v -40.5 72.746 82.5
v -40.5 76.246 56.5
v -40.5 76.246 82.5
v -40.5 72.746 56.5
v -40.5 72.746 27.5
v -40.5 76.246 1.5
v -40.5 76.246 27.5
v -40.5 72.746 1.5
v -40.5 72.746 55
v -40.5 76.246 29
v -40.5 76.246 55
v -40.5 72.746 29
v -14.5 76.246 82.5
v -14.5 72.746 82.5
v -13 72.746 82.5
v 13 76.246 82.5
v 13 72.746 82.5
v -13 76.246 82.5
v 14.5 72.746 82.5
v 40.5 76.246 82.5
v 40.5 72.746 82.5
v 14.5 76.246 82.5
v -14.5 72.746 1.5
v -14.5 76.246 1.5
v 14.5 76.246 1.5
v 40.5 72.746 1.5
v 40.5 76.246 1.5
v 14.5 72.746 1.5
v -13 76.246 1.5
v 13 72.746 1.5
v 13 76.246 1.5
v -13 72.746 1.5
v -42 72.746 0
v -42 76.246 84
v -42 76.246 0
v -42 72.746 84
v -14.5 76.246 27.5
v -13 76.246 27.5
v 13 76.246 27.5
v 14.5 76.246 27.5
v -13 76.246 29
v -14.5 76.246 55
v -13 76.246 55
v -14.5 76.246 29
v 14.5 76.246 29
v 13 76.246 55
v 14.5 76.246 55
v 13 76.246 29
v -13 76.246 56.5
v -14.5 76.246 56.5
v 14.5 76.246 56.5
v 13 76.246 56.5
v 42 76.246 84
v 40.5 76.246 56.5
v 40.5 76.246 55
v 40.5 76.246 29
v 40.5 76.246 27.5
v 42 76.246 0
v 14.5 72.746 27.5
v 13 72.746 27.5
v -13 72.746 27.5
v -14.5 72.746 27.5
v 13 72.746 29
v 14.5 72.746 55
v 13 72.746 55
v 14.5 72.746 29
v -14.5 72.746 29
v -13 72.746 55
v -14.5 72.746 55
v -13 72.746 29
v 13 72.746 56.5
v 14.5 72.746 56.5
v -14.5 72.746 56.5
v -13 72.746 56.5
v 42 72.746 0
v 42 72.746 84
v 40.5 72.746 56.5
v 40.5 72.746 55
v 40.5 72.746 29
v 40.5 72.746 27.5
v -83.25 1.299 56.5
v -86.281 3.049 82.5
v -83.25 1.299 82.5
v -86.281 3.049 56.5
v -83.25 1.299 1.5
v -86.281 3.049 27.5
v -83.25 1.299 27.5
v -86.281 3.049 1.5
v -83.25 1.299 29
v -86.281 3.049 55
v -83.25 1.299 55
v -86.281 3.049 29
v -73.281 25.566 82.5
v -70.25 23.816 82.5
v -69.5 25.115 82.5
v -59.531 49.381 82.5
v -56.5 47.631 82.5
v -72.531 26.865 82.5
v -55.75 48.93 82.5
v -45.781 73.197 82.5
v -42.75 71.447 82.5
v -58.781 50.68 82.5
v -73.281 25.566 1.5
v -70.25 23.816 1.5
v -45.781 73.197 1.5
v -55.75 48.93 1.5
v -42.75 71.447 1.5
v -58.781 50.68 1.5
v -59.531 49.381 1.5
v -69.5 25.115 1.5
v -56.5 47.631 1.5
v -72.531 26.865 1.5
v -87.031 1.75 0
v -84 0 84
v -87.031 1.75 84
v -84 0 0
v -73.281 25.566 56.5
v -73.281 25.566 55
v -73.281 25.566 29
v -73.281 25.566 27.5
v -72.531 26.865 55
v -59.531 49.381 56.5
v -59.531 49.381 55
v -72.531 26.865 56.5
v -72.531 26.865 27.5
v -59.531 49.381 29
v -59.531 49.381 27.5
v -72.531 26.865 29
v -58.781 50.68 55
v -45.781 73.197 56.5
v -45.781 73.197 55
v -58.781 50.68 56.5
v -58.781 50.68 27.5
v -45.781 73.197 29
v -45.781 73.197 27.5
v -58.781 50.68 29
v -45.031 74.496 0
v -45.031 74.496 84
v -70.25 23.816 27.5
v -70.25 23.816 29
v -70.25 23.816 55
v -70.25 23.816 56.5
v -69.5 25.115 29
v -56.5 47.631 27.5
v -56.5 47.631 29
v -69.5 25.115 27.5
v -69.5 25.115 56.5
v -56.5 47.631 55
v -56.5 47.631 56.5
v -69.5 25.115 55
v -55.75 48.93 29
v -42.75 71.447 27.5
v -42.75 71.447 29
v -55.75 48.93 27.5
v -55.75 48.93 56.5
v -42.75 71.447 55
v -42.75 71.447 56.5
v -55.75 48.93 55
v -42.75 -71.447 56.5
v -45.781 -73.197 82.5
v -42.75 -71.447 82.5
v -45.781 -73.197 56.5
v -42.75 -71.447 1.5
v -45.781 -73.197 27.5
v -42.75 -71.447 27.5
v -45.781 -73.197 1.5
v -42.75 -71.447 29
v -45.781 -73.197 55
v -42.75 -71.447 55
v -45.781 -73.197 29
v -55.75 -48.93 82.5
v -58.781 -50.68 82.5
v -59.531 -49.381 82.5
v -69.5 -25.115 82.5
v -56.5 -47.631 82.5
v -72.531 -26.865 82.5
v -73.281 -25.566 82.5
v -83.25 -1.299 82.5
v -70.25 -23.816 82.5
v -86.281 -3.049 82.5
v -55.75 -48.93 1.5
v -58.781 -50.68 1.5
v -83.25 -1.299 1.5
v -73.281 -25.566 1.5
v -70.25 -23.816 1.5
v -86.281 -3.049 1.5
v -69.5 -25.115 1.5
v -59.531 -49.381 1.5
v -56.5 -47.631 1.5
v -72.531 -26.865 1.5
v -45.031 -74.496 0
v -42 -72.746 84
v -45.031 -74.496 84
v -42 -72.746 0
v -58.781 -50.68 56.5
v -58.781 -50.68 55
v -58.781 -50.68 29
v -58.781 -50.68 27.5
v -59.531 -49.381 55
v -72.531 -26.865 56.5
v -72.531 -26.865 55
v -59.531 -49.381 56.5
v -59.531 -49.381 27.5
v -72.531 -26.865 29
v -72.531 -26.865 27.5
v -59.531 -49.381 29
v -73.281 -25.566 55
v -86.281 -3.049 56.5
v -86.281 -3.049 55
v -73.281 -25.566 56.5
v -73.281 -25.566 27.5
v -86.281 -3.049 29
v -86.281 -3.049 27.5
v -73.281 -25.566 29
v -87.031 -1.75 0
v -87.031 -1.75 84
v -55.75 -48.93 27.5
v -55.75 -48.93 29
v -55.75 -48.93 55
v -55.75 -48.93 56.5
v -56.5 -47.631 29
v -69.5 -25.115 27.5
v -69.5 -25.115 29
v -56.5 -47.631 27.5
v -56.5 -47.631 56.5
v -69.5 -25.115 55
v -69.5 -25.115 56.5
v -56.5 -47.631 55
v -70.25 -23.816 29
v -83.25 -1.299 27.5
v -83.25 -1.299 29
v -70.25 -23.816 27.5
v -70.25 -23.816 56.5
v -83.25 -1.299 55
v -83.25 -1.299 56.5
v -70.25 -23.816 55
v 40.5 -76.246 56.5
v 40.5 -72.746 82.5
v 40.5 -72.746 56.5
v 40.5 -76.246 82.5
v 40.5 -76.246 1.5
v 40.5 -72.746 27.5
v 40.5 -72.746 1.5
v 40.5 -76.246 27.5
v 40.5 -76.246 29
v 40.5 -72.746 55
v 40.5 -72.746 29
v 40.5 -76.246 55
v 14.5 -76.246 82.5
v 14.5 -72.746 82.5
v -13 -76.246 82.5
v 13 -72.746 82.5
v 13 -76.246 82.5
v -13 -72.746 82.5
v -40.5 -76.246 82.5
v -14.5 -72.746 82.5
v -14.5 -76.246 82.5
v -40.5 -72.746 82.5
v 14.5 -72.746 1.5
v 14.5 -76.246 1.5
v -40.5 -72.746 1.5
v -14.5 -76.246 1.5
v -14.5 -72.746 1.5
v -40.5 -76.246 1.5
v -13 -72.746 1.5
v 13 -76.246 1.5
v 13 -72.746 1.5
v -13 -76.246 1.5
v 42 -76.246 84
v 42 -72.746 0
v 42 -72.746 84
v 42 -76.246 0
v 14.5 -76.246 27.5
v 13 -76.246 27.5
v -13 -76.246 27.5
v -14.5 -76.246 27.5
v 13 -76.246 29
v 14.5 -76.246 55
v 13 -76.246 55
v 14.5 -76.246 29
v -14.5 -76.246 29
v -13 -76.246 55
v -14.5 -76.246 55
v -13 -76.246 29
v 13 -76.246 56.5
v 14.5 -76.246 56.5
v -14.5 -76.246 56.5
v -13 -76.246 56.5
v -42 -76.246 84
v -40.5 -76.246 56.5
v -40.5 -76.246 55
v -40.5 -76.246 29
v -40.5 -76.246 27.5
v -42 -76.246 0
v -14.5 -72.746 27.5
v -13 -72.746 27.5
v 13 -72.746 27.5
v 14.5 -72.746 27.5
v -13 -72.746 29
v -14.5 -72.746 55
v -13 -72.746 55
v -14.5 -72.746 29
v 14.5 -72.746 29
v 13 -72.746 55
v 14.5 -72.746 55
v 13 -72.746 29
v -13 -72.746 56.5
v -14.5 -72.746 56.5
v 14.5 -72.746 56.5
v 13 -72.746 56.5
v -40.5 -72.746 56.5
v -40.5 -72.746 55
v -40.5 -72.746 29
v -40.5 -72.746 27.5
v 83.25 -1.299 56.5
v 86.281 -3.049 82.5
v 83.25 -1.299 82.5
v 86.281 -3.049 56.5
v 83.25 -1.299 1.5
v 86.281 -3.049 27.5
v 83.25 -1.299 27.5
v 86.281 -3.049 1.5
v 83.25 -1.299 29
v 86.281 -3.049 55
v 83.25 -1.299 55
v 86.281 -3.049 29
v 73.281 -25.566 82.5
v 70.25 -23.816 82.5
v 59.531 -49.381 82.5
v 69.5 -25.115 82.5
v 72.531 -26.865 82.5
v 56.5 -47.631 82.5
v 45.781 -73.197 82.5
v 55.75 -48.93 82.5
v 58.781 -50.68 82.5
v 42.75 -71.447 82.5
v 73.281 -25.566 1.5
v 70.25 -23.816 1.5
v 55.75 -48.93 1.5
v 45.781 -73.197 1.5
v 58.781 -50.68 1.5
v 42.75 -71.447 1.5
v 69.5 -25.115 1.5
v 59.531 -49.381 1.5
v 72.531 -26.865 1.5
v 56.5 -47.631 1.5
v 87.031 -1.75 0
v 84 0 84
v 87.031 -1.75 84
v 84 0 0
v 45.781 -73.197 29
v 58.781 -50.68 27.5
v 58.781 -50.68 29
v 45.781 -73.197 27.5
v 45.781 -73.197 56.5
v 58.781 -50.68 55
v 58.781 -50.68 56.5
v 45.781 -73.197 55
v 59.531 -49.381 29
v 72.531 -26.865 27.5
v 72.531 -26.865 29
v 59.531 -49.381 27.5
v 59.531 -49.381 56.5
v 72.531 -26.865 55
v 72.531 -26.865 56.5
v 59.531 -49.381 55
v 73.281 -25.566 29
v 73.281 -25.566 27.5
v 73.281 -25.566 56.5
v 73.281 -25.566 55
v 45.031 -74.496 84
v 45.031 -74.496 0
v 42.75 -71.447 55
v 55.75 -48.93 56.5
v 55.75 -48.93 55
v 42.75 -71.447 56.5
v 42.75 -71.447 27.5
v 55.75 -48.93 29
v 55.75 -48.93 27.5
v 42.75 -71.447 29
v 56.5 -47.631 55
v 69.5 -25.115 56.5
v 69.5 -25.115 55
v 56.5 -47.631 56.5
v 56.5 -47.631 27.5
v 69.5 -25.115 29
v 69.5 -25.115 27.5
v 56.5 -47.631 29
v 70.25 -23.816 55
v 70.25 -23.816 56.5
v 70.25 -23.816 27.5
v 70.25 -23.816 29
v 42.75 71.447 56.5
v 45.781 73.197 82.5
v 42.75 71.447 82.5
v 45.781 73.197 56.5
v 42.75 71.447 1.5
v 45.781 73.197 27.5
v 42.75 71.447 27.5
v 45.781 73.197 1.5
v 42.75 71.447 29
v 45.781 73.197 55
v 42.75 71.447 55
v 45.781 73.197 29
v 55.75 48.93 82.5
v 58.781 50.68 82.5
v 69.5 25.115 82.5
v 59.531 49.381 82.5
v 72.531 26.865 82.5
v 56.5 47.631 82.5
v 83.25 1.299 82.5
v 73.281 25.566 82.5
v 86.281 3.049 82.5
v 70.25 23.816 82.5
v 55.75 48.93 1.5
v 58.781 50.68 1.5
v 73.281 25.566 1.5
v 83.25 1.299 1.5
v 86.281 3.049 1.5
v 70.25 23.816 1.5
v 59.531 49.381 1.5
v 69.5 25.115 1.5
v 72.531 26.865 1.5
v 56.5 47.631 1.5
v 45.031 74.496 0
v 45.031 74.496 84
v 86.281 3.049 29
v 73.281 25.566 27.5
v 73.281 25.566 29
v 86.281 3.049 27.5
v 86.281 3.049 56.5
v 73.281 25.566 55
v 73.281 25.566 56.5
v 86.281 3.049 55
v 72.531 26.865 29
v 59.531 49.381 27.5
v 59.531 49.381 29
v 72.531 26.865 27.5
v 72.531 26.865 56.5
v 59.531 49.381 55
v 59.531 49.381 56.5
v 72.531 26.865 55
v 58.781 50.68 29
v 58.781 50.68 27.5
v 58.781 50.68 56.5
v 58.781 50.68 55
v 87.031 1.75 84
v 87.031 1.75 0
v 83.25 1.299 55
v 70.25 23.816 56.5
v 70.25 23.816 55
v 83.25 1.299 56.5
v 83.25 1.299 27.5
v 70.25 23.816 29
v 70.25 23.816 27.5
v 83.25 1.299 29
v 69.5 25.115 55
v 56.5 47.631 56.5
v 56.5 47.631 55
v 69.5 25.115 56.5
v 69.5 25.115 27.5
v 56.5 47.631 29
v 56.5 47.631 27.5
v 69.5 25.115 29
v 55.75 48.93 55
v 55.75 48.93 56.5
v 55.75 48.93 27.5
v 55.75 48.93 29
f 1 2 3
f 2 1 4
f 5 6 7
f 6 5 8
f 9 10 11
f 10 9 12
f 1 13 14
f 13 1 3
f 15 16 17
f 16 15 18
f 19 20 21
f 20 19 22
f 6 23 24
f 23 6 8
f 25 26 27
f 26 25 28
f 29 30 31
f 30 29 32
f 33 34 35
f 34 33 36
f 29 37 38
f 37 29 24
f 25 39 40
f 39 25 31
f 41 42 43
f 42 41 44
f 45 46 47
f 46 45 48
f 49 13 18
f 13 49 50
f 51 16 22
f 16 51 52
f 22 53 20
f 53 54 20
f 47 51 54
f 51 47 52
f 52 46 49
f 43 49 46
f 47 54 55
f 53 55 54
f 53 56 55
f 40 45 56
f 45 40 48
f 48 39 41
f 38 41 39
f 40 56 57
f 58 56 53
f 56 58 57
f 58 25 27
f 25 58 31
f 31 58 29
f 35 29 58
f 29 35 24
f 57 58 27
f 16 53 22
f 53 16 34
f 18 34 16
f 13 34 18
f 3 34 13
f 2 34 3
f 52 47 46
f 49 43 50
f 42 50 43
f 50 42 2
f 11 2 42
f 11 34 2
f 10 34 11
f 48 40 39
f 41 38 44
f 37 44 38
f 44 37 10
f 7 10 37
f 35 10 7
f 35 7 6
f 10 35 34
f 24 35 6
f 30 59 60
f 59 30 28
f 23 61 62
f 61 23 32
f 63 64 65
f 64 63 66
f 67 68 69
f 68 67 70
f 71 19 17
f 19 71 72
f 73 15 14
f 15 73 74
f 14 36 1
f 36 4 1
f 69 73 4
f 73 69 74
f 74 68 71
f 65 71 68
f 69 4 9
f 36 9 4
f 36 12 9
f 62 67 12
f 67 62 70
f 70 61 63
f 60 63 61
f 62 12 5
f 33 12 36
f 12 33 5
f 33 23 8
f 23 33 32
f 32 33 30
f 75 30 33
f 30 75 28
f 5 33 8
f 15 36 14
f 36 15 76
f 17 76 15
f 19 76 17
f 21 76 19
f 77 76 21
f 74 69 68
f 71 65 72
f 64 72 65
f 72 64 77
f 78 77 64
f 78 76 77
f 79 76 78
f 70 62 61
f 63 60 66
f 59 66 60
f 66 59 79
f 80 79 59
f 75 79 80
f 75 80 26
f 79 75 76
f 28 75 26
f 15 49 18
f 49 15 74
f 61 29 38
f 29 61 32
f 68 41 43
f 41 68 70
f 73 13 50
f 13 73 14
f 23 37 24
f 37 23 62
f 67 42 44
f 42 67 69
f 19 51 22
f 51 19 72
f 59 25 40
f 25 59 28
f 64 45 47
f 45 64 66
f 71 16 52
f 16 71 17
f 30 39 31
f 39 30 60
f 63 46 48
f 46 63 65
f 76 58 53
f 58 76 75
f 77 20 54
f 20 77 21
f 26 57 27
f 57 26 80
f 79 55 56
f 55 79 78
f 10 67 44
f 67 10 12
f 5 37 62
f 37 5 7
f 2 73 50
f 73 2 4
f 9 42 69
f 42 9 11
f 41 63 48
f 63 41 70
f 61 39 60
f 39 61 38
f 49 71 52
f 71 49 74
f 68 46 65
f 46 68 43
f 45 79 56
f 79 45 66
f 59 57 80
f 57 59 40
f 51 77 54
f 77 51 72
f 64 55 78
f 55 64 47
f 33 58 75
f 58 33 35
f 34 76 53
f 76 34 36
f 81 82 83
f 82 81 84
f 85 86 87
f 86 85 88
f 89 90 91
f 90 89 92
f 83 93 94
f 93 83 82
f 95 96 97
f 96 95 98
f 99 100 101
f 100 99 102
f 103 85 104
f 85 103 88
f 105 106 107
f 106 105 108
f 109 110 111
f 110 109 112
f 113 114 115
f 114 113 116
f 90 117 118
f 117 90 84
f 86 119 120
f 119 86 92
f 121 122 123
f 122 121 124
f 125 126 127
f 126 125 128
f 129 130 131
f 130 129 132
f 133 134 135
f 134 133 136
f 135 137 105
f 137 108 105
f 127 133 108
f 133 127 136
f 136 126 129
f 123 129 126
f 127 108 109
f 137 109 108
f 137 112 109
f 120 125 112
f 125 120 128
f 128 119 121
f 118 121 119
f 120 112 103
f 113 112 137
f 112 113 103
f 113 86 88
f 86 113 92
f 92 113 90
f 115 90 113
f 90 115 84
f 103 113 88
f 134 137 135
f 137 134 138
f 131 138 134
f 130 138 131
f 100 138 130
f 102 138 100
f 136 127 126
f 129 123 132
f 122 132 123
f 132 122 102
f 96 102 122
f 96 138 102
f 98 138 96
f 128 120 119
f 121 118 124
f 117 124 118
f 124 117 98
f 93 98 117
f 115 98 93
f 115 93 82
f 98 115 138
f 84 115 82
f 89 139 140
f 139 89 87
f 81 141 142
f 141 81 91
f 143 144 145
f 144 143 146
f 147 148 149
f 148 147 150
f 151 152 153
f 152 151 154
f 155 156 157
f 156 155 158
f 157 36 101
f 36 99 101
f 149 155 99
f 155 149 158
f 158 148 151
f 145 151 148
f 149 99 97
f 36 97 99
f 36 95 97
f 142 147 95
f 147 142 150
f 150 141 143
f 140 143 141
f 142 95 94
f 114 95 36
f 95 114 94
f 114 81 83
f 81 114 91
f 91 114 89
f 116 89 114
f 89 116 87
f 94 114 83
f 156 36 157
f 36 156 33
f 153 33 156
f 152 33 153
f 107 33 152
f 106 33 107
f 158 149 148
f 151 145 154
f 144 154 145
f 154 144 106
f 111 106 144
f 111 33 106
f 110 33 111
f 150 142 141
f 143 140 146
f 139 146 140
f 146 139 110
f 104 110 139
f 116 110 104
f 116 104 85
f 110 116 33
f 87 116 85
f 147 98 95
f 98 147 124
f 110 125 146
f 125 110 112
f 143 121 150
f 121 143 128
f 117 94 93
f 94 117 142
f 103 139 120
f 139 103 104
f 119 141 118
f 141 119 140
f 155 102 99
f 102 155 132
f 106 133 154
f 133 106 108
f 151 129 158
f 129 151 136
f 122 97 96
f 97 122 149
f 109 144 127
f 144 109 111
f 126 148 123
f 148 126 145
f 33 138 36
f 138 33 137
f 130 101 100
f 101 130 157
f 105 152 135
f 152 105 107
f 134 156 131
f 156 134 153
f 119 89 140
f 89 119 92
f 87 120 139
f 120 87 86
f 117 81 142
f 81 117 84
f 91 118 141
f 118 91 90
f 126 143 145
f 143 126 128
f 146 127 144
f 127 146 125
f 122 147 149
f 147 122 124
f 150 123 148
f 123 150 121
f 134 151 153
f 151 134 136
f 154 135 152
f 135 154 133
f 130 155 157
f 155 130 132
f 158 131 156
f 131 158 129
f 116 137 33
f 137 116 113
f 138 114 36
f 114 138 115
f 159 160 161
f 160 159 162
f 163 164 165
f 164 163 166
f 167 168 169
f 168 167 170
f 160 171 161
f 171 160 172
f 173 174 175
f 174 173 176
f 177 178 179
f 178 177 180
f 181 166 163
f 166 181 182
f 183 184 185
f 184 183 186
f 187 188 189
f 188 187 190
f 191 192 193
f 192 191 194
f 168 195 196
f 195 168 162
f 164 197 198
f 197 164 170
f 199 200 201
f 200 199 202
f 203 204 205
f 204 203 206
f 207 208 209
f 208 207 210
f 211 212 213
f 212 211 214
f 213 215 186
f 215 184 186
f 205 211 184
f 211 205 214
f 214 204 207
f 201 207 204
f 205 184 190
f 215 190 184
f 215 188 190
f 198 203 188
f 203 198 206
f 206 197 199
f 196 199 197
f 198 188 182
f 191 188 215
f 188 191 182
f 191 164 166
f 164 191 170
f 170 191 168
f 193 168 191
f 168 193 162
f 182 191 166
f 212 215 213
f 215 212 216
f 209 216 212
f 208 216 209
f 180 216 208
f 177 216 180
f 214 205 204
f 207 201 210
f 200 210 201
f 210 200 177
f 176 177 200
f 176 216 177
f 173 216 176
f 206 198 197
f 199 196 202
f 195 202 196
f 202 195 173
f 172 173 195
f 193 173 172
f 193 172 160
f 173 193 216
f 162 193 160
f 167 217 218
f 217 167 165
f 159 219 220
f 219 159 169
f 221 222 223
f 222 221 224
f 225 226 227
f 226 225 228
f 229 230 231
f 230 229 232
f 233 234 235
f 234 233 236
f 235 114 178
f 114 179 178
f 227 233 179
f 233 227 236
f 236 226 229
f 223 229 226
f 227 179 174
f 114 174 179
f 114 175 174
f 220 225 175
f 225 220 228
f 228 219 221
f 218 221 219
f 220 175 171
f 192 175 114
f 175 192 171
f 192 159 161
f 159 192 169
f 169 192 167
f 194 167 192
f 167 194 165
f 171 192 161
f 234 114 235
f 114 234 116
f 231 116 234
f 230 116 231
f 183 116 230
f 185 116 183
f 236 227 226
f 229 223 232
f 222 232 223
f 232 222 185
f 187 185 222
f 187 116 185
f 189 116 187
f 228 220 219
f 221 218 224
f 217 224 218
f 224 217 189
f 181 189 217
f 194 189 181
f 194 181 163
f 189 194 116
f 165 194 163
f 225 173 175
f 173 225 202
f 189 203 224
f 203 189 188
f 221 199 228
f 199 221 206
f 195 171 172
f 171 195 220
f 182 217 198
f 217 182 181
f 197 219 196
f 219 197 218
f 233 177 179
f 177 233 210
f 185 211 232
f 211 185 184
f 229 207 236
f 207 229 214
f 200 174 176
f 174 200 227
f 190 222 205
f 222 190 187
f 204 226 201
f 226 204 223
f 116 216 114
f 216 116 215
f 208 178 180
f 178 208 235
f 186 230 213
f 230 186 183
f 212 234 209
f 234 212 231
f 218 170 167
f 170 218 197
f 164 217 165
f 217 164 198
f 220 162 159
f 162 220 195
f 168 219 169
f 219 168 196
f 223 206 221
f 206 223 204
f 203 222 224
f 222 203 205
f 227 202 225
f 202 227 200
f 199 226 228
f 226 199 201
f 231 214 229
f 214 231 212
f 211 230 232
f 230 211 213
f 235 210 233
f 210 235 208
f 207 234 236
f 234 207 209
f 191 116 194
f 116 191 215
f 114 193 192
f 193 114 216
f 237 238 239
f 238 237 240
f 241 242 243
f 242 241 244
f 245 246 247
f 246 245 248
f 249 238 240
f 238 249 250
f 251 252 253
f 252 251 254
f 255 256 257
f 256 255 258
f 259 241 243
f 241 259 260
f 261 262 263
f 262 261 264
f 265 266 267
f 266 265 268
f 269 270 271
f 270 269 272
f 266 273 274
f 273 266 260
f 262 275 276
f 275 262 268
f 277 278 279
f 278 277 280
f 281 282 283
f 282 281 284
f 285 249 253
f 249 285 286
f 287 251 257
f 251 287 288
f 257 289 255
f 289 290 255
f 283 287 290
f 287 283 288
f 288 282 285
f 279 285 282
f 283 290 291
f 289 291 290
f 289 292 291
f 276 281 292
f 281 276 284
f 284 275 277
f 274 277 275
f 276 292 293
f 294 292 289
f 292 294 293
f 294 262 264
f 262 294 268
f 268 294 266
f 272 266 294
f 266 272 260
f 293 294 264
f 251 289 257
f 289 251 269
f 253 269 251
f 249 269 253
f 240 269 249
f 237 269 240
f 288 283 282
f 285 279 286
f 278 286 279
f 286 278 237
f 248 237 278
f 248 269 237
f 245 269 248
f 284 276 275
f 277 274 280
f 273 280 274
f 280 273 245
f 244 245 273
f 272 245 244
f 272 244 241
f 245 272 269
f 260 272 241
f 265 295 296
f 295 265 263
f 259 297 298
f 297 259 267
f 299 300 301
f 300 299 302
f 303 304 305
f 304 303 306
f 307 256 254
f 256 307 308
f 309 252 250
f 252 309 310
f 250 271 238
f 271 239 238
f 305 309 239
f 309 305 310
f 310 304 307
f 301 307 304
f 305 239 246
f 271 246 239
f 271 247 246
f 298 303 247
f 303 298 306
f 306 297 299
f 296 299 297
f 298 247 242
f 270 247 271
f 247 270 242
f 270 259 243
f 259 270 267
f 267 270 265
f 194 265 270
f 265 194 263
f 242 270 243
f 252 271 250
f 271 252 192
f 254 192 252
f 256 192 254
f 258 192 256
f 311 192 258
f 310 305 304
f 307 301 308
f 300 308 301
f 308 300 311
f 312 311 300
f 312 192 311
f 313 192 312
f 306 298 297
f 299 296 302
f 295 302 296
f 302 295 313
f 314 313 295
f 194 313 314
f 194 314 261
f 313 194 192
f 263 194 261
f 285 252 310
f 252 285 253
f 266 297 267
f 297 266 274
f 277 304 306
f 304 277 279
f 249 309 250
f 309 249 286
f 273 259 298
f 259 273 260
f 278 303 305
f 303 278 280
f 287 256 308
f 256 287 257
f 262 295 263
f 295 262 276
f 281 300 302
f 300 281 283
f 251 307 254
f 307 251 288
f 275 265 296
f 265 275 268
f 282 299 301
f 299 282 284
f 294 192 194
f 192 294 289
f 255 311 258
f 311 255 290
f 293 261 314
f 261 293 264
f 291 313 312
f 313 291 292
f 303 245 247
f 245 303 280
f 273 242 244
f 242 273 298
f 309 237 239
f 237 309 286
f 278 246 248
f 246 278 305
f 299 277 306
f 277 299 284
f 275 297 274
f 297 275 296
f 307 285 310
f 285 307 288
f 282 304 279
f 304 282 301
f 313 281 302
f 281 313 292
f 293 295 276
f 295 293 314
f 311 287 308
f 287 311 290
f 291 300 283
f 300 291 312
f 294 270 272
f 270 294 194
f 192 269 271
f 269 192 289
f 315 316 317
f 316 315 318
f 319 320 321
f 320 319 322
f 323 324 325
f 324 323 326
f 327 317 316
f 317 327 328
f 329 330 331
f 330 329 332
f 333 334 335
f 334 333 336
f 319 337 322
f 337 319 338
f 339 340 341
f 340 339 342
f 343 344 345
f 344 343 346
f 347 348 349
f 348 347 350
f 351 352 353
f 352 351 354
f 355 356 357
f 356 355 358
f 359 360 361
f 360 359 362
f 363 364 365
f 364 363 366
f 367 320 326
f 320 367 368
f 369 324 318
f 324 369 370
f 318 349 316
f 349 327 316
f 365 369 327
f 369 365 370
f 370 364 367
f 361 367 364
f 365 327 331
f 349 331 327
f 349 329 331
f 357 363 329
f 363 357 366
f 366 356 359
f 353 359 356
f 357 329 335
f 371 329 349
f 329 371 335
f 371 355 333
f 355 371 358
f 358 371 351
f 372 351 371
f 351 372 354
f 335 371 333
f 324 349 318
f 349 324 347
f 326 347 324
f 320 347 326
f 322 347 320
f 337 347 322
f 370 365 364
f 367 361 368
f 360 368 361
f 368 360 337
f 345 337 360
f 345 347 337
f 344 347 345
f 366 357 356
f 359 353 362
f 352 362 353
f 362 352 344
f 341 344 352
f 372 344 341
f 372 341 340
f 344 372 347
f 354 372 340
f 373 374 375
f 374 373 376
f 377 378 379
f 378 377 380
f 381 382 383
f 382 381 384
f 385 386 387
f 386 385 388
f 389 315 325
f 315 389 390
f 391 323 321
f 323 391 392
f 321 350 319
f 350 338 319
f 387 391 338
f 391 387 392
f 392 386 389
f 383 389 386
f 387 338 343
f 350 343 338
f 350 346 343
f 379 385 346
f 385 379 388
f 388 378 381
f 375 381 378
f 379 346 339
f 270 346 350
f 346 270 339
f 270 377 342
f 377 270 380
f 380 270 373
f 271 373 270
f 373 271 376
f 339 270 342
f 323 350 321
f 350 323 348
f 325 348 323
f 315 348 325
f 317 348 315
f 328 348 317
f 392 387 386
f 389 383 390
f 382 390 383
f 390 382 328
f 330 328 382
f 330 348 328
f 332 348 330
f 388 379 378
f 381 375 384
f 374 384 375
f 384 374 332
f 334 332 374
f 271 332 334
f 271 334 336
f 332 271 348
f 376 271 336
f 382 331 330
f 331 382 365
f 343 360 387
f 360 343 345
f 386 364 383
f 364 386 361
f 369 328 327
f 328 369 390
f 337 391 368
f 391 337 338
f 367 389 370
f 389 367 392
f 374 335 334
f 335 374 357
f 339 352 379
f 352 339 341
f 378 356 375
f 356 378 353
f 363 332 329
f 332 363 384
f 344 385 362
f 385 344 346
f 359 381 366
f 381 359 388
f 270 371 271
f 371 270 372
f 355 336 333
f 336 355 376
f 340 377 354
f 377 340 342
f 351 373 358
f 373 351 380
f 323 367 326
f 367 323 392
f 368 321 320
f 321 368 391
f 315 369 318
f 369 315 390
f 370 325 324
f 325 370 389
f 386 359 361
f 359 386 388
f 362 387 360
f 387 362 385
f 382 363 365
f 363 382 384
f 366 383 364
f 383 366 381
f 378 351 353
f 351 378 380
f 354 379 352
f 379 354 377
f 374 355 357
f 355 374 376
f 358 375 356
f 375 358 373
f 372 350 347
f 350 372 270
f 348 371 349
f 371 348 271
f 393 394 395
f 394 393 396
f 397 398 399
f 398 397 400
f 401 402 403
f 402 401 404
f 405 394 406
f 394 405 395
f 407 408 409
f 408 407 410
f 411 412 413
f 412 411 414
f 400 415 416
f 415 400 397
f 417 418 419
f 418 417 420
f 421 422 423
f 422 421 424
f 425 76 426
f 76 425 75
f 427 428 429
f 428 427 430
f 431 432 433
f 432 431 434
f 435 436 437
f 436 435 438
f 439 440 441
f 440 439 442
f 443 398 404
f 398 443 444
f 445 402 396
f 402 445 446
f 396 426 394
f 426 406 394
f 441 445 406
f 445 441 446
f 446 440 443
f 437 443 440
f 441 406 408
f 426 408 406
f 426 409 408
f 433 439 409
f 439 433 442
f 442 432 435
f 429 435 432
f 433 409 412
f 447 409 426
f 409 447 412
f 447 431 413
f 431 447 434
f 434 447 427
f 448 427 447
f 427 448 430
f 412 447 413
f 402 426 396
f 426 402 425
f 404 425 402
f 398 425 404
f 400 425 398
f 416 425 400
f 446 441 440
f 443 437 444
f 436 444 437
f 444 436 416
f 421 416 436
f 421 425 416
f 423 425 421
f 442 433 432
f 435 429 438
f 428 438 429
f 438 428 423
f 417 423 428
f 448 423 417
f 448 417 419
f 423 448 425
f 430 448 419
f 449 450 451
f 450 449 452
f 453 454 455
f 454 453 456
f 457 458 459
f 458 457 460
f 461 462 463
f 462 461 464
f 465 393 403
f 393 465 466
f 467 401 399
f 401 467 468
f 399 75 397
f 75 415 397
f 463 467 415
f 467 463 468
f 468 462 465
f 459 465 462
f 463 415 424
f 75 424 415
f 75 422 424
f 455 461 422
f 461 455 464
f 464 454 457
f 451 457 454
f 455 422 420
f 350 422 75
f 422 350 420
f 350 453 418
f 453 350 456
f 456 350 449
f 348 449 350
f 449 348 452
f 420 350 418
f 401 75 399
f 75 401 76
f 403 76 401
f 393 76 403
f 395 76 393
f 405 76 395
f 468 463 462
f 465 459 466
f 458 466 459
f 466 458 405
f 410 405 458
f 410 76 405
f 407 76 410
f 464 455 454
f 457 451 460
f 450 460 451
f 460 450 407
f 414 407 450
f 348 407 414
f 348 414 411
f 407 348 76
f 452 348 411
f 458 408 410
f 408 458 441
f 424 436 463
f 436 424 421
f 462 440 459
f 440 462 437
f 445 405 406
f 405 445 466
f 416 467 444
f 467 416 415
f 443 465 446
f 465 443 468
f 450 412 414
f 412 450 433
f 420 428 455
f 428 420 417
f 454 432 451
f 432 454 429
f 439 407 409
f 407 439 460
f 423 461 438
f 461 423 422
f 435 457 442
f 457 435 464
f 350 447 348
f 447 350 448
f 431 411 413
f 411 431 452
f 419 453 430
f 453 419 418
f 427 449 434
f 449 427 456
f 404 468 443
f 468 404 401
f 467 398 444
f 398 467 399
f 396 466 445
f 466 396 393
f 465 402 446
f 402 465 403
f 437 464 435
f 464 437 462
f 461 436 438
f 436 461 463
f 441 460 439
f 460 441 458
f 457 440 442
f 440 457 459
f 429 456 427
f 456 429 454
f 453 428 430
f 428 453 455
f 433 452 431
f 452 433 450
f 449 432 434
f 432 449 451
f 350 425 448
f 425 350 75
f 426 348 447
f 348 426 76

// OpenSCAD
// file: lumber.scad
lumber_nominal_thick = 2;
lumber_width_thick = 4;

lumber_thick = lumber_nominal_thick - 0.5;
lumber_width = lumber_width_thick - 0.5;

module beam(length) {
  echo(str("BEAM: beam (",lumber_thick,"x",lumber_width,"): length ",  length, "in."));
  color("brown") {
    cube([length, lumber_width, lumber_thick], false);
  }
}

module stud(length) {
  echo(str("BEAM: stud (",lumber_thick,"x",lumber_width,"): length ",  length, "in."));
  color("brown") {
    cube([lumber_thick, lumber_width, length], false);
  }
}

module noggin(length) {
  echo(str("BEAM: noggin (",lumber_thick,"x",lumber_width,"): length ",  length, "in."));
  color("brown") {
    cube([length, lumber_width, lumber_thick], false);
  }
}
// file: config.scad
wall_height = 7 * 12;
wall_width = 7 * 12;

vertical_sections = 3;
horizontal_sections = 3;
// main file
include <config.scad>;
include <lumber.scad>;

module wall() {
  translate([
    -wall_width / 2,
    sqrt((wall_width * wall_width) - ((wall_width / 2) * (wall_width / 2))),
    0
  ]) {
    beam(wall_width);
    translate([0, 0, lumber_thick]) {
      let(
        beam_count = vertical_sections,
        noggin_count = horizontal_sections - 1,
        dist_h = (wall_width - lumber_thick) / beam_count,
        effective_height = wall_height - (lumber_thick * 2),
        dist_v = (effective_height - lumber_thick * noggin_count) / horizontal_sections,
        noggin_length = dist_h - lumber_thick
      ) {
        for(section = [0 : 1 : beam_count]) {
          translate([section * dist_h, 0, 0]) {
            stud(effective_height);
          }
        }
        for(h = [0 : 1 : beam_count - 1]) {
          for(v = [0 : 1 : noggin_count - 1]) {
            translate([
              h * dist_h + lumber_thick,
              0,
              dist_v + (v * (dist_v + lumber_thick))
            ]) {
              noggin(noggin_length);
            }
          }
        }
      }
    }
    translate([0, 0, wall_height - lumber_thick]) {
      beam(wall_width);
    }
  }
}

for(s = [0: 1: 5]) {
  rotate([0, 0, 60 * s]) {
    wall();
  }
}
